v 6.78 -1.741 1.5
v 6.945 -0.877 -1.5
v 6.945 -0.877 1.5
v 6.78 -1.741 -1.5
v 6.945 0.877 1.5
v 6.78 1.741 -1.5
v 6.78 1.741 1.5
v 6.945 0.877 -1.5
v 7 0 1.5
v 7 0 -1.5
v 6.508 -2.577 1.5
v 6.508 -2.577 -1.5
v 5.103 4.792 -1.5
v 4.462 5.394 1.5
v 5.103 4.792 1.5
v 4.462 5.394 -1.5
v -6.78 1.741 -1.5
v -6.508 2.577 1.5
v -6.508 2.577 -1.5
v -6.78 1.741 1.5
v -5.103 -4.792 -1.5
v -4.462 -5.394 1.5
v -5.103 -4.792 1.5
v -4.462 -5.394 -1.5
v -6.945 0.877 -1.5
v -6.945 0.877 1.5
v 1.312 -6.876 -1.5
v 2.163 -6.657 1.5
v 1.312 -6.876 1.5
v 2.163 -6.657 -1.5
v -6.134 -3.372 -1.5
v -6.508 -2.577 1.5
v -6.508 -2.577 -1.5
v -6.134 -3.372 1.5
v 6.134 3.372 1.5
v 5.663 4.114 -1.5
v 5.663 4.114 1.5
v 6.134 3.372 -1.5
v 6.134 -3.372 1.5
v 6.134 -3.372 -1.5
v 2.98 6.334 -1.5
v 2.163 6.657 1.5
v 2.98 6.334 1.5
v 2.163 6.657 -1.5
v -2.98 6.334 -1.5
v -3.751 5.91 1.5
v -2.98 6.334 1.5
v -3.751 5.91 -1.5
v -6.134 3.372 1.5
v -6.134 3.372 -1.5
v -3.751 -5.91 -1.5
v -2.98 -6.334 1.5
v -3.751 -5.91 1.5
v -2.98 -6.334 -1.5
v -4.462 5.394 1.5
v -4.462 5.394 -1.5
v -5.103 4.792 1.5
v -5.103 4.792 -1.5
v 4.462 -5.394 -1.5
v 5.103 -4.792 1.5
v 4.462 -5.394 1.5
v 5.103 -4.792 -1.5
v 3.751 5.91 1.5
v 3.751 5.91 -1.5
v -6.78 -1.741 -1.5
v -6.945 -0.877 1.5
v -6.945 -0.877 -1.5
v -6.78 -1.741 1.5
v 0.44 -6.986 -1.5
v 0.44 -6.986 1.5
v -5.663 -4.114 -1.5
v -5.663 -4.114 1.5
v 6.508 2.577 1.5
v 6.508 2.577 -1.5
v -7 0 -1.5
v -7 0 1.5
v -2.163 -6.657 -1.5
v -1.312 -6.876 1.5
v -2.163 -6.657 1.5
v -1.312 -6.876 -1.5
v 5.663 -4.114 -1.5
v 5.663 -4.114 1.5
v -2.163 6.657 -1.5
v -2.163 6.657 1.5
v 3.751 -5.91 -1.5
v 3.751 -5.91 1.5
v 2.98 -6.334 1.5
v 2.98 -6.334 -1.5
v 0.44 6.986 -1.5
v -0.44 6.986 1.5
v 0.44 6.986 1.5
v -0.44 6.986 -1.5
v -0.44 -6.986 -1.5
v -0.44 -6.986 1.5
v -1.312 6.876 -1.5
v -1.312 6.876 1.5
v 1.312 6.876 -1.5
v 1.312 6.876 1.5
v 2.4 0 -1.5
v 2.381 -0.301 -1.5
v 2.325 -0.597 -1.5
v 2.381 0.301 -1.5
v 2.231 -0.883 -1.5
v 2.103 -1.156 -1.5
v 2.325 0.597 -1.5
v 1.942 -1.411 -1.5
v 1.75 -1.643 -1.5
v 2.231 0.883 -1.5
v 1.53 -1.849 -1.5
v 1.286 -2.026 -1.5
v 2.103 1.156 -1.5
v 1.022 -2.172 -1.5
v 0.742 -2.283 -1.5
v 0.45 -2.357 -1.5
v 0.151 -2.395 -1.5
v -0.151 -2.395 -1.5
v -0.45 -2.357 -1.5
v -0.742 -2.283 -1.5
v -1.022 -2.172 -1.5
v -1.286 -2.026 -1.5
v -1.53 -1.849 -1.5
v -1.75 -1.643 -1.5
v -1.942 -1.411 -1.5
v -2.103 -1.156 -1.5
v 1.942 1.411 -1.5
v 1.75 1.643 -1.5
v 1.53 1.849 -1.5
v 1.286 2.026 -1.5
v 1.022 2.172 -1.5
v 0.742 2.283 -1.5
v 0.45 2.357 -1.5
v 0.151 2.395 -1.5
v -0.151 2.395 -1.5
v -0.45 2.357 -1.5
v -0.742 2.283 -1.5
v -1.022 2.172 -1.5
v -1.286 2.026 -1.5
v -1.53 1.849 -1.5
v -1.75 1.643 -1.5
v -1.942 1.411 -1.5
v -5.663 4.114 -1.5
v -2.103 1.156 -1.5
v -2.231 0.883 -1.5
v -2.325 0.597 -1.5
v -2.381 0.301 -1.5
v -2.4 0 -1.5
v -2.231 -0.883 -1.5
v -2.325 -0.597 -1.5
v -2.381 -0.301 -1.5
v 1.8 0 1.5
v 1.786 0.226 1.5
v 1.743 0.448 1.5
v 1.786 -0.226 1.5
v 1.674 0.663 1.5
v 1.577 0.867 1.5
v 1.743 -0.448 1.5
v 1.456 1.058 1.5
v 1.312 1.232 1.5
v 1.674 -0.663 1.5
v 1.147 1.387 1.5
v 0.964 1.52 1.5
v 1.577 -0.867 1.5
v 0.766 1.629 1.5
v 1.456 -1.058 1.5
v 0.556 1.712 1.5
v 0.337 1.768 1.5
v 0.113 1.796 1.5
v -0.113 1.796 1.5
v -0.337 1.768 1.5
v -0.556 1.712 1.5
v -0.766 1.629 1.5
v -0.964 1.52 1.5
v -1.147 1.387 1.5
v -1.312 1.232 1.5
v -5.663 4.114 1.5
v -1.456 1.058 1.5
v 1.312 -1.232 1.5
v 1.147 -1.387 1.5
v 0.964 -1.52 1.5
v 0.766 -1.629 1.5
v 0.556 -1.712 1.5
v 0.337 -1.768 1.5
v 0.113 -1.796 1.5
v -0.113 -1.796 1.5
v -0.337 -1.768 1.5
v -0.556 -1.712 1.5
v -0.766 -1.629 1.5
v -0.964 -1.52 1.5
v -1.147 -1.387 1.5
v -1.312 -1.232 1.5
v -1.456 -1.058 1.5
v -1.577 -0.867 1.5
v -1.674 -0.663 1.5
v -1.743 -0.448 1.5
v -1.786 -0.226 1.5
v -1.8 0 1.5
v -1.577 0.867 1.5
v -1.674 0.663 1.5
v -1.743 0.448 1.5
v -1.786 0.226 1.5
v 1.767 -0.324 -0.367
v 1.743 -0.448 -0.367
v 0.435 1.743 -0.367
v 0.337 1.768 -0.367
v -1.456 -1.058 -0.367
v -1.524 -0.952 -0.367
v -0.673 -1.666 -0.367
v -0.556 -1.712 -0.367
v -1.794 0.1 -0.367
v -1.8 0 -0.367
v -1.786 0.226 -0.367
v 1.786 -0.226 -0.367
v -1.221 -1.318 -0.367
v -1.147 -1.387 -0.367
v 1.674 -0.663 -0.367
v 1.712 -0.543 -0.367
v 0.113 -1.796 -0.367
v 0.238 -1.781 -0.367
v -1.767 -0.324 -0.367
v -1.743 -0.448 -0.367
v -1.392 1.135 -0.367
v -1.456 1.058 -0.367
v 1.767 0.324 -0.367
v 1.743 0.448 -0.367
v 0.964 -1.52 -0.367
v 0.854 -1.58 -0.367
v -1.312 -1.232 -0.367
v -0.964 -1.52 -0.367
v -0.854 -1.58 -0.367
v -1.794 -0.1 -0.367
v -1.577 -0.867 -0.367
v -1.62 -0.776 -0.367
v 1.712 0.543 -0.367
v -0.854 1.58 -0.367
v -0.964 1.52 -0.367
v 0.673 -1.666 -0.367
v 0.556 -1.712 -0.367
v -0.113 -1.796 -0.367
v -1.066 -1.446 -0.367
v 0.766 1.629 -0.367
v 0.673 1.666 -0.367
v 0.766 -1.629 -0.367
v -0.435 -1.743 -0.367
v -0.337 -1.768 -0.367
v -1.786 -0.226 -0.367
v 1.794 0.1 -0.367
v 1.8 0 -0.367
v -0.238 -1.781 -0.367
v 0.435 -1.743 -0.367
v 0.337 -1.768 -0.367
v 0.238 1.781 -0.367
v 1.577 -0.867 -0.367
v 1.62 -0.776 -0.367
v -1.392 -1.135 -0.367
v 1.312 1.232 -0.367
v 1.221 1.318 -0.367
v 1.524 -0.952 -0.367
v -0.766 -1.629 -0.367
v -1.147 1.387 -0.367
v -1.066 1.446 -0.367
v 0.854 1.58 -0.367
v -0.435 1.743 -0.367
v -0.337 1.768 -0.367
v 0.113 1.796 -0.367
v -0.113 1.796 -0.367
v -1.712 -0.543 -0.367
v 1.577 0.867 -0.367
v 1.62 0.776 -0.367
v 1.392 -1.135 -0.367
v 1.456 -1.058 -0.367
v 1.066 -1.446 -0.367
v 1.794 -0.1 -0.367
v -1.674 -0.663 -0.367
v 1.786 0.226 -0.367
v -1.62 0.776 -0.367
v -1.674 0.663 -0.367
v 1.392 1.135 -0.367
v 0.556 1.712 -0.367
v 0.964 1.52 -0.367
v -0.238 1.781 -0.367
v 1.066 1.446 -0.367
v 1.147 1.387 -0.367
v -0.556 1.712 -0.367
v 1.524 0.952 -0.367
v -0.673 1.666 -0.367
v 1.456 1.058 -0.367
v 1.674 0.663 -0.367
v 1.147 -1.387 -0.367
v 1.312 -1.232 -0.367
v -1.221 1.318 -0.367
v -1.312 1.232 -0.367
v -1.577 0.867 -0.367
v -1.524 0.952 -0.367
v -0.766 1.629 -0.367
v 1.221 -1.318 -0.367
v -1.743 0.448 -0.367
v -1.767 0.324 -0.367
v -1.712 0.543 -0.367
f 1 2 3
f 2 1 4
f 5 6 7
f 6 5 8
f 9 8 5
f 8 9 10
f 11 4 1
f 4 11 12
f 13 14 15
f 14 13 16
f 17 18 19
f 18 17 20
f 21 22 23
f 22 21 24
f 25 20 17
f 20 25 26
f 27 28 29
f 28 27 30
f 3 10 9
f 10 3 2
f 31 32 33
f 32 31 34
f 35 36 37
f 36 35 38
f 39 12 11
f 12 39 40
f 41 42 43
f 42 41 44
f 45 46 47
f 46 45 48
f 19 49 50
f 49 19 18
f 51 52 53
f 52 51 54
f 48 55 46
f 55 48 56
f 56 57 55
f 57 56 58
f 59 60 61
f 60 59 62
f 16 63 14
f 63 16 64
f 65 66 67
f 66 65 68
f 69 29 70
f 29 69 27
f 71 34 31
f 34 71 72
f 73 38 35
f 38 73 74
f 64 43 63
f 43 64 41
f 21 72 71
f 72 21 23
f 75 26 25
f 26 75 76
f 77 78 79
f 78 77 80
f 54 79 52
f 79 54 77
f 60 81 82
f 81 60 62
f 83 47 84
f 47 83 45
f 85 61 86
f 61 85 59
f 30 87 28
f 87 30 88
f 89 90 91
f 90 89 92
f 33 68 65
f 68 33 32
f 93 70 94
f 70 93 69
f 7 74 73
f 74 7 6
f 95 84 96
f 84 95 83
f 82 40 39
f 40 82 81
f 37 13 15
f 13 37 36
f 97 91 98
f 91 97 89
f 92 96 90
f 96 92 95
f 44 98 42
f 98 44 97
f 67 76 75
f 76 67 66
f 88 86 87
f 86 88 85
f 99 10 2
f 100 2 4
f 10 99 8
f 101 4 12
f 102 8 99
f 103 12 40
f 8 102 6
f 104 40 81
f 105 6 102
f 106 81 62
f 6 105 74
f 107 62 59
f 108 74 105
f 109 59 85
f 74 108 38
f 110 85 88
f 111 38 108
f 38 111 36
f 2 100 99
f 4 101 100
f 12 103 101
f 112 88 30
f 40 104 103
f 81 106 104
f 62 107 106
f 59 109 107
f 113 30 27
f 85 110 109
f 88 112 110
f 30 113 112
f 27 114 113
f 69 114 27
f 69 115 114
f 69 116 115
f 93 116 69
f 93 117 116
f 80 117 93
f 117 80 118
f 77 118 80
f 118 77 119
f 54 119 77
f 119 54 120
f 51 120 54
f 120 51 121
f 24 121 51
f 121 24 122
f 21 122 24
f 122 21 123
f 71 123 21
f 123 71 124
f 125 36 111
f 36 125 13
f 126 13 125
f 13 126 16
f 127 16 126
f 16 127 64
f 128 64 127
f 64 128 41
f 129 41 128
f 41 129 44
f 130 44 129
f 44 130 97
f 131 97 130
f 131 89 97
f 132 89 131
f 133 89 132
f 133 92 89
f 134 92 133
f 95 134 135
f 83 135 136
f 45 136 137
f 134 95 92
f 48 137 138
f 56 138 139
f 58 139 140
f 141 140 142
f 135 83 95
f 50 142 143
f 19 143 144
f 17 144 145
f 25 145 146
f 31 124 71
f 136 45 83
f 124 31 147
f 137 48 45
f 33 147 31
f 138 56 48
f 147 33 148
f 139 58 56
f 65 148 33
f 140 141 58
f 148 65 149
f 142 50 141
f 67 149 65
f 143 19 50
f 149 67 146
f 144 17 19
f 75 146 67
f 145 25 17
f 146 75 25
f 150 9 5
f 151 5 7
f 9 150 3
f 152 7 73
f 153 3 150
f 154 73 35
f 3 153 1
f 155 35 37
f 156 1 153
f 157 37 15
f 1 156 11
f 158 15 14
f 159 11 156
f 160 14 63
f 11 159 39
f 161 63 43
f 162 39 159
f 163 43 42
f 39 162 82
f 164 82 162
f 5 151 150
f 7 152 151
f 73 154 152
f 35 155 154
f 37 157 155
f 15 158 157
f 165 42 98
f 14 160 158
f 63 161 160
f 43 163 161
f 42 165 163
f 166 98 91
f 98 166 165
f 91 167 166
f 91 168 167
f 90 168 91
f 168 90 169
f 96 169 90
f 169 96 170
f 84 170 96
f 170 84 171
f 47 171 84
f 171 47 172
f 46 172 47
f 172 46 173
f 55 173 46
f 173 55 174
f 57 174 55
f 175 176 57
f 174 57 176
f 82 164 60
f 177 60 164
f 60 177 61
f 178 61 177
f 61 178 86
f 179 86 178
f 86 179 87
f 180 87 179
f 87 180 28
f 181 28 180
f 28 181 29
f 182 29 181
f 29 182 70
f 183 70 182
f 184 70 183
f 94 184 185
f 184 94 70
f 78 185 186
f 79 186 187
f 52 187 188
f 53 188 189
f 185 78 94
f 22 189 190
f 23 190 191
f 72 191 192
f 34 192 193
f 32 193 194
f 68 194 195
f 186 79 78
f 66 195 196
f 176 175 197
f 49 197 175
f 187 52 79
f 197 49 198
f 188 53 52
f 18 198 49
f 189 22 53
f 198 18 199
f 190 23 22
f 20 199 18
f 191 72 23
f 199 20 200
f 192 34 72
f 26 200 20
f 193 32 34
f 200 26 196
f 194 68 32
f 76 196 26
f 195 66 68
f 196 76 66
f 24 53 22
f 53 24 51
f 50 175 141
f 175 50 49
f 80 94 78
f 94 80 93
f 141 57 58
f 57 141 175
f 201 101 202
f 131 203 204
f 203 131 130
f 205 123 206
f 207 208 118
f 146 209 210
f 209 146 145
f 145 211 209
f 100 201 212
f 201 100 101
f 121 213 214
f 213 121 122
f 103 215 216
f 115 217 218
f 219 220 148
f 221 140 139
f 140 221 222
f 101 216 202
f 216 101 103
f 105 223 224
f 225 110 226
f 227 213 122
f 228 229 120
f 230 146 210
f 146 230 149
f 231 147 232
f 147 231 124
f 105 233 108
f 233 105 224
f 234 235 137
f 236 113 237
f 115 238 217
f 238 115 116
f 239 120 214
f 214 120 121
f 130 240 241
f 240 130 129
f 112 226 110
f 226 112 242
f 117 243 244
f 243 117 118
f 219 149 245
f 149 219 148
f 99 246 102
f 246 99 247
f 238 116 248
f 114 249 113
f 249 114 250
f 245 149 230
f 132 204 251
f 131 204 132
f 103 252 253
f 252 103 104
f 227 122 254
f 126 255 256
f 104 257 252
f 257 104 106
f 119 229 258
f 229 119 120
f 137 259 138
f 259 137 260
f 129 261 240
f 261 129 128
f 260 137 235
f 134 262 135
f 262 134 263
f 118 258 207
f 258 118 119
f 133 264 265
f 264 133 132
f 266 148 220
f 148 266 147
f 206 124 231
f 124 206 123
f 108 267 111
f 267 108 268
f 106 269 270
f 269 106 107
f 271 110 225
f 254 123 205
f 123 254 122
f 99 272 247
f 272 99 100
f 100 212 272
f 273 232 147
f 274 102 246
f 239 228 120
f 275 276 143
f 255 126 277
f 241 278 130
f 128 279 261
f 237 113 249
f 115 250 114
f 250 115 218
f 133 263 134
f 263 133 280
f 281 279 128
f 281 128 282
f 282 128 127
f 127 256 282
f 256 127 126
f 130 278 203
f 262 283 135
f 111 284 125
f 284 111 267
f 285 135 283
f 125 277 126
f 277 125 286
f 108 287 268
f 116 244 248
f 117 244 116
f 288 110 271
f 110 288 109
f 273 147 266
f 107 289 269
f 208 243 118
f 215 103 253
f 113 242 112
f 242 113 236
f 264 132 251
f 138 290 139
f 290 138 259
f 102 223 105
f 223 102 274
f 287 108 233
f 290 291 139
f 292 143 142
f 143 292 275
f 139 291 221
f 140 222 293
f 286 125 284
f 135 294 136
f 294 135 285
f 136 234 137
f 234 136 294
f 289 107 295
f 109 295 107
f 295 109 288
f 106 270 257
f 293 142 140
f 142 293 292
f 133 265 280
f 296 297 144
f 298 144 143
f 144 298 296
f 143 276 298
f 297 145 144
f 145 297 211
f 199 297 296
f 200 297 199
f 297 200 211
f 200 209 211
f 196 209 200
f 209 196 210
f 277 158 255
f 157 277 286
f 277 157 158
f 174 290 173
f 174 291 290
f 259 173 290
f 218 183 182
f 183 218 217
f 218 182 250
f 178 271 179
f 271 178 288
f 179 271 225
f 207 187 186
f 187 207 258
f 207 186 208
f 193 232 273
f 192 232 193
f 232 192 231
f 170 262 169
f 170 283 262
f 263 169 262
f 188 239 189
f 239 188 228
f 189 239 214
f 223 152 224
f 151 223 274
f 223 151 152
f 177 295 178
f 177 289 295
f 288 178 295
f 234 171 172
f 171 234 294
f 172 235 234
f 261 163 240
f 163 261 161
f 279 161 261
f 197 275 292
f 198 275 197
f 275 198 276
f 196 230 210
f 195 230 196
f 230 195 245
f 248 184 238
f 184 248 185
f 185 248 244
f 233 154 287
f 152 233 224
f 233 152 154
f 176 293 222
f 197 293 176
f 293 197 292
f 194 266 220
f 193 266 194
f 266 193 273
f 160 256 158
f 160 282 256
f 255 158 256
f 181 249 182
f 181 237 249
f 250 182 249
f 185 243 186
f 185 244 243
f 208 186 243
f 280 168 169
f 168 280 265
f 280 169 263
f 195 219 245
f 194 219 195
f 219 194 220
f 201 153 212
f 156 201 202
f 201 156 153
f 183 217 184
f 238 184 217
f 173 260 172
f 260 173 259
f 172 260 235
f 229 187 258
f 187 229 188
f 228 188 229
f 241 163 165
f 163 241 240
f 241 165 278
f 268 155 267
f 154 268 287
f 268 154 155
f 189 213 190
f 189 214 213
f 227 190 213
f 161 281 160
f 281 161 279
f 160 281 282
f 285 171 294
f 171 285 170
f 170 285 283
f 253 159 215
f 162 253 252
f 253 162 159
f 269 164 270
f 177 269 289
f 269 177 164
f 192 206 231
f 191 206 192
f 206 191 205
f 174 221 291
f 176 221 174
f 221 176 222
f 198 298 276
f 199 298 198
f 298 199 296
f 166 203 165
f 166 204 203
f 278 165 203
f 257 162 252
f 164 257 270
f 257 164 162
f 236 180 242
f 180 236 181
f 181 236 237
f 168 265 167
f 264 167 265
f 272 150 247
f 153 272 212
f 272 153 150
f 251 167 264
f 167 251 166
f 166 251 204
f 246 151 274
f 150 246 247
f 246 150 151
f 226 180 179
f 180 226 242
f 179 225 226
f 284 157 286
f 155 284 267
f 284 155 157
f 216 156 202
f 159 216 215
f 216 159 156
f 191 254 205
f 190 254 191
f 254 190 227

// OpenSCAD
$fn = 50;


difference() {
	union() {
		translate(v = [0, 0, -1.5000000000]) {
			cylinder(h = 3, r = 7.0000000000);
		}
		translate(v = [0, 0, -1.5000000000]) {
			cylinder(h = 3, r = 3.0000000000);
		}
	}
	union() {
		translate(v = [0, 0, -1.5000000000]) {
			rotate(a = [0, 180, 0]) {
				difference() {
					union() {
						translate(v = [0, 0, -1.7000000000]) {
							cylinder(h = 1.7000000000, r1 = 1.5000000000, r2 = 2.4000000000);
						}
						translate(v = [0, 0, -3.0000000000]) {
							cylinder(h = 3, r = 1.5000000000);
						}
						translate(v = [0, 0, -3.0000000000]) {
							cylinder(h = 3, r = 1.8000000000);
						}
						translate(v = [0, 0, -3.0000000000]) {
							cylinder(h = 3, r = 1.5000000000);
						}
					}
					union();
				}
			}
		}
		translate(v = [0, 0, -100.0000000000]) {
			cylinder(h = 200, r = 1.5000000000);
		}
	}
}
